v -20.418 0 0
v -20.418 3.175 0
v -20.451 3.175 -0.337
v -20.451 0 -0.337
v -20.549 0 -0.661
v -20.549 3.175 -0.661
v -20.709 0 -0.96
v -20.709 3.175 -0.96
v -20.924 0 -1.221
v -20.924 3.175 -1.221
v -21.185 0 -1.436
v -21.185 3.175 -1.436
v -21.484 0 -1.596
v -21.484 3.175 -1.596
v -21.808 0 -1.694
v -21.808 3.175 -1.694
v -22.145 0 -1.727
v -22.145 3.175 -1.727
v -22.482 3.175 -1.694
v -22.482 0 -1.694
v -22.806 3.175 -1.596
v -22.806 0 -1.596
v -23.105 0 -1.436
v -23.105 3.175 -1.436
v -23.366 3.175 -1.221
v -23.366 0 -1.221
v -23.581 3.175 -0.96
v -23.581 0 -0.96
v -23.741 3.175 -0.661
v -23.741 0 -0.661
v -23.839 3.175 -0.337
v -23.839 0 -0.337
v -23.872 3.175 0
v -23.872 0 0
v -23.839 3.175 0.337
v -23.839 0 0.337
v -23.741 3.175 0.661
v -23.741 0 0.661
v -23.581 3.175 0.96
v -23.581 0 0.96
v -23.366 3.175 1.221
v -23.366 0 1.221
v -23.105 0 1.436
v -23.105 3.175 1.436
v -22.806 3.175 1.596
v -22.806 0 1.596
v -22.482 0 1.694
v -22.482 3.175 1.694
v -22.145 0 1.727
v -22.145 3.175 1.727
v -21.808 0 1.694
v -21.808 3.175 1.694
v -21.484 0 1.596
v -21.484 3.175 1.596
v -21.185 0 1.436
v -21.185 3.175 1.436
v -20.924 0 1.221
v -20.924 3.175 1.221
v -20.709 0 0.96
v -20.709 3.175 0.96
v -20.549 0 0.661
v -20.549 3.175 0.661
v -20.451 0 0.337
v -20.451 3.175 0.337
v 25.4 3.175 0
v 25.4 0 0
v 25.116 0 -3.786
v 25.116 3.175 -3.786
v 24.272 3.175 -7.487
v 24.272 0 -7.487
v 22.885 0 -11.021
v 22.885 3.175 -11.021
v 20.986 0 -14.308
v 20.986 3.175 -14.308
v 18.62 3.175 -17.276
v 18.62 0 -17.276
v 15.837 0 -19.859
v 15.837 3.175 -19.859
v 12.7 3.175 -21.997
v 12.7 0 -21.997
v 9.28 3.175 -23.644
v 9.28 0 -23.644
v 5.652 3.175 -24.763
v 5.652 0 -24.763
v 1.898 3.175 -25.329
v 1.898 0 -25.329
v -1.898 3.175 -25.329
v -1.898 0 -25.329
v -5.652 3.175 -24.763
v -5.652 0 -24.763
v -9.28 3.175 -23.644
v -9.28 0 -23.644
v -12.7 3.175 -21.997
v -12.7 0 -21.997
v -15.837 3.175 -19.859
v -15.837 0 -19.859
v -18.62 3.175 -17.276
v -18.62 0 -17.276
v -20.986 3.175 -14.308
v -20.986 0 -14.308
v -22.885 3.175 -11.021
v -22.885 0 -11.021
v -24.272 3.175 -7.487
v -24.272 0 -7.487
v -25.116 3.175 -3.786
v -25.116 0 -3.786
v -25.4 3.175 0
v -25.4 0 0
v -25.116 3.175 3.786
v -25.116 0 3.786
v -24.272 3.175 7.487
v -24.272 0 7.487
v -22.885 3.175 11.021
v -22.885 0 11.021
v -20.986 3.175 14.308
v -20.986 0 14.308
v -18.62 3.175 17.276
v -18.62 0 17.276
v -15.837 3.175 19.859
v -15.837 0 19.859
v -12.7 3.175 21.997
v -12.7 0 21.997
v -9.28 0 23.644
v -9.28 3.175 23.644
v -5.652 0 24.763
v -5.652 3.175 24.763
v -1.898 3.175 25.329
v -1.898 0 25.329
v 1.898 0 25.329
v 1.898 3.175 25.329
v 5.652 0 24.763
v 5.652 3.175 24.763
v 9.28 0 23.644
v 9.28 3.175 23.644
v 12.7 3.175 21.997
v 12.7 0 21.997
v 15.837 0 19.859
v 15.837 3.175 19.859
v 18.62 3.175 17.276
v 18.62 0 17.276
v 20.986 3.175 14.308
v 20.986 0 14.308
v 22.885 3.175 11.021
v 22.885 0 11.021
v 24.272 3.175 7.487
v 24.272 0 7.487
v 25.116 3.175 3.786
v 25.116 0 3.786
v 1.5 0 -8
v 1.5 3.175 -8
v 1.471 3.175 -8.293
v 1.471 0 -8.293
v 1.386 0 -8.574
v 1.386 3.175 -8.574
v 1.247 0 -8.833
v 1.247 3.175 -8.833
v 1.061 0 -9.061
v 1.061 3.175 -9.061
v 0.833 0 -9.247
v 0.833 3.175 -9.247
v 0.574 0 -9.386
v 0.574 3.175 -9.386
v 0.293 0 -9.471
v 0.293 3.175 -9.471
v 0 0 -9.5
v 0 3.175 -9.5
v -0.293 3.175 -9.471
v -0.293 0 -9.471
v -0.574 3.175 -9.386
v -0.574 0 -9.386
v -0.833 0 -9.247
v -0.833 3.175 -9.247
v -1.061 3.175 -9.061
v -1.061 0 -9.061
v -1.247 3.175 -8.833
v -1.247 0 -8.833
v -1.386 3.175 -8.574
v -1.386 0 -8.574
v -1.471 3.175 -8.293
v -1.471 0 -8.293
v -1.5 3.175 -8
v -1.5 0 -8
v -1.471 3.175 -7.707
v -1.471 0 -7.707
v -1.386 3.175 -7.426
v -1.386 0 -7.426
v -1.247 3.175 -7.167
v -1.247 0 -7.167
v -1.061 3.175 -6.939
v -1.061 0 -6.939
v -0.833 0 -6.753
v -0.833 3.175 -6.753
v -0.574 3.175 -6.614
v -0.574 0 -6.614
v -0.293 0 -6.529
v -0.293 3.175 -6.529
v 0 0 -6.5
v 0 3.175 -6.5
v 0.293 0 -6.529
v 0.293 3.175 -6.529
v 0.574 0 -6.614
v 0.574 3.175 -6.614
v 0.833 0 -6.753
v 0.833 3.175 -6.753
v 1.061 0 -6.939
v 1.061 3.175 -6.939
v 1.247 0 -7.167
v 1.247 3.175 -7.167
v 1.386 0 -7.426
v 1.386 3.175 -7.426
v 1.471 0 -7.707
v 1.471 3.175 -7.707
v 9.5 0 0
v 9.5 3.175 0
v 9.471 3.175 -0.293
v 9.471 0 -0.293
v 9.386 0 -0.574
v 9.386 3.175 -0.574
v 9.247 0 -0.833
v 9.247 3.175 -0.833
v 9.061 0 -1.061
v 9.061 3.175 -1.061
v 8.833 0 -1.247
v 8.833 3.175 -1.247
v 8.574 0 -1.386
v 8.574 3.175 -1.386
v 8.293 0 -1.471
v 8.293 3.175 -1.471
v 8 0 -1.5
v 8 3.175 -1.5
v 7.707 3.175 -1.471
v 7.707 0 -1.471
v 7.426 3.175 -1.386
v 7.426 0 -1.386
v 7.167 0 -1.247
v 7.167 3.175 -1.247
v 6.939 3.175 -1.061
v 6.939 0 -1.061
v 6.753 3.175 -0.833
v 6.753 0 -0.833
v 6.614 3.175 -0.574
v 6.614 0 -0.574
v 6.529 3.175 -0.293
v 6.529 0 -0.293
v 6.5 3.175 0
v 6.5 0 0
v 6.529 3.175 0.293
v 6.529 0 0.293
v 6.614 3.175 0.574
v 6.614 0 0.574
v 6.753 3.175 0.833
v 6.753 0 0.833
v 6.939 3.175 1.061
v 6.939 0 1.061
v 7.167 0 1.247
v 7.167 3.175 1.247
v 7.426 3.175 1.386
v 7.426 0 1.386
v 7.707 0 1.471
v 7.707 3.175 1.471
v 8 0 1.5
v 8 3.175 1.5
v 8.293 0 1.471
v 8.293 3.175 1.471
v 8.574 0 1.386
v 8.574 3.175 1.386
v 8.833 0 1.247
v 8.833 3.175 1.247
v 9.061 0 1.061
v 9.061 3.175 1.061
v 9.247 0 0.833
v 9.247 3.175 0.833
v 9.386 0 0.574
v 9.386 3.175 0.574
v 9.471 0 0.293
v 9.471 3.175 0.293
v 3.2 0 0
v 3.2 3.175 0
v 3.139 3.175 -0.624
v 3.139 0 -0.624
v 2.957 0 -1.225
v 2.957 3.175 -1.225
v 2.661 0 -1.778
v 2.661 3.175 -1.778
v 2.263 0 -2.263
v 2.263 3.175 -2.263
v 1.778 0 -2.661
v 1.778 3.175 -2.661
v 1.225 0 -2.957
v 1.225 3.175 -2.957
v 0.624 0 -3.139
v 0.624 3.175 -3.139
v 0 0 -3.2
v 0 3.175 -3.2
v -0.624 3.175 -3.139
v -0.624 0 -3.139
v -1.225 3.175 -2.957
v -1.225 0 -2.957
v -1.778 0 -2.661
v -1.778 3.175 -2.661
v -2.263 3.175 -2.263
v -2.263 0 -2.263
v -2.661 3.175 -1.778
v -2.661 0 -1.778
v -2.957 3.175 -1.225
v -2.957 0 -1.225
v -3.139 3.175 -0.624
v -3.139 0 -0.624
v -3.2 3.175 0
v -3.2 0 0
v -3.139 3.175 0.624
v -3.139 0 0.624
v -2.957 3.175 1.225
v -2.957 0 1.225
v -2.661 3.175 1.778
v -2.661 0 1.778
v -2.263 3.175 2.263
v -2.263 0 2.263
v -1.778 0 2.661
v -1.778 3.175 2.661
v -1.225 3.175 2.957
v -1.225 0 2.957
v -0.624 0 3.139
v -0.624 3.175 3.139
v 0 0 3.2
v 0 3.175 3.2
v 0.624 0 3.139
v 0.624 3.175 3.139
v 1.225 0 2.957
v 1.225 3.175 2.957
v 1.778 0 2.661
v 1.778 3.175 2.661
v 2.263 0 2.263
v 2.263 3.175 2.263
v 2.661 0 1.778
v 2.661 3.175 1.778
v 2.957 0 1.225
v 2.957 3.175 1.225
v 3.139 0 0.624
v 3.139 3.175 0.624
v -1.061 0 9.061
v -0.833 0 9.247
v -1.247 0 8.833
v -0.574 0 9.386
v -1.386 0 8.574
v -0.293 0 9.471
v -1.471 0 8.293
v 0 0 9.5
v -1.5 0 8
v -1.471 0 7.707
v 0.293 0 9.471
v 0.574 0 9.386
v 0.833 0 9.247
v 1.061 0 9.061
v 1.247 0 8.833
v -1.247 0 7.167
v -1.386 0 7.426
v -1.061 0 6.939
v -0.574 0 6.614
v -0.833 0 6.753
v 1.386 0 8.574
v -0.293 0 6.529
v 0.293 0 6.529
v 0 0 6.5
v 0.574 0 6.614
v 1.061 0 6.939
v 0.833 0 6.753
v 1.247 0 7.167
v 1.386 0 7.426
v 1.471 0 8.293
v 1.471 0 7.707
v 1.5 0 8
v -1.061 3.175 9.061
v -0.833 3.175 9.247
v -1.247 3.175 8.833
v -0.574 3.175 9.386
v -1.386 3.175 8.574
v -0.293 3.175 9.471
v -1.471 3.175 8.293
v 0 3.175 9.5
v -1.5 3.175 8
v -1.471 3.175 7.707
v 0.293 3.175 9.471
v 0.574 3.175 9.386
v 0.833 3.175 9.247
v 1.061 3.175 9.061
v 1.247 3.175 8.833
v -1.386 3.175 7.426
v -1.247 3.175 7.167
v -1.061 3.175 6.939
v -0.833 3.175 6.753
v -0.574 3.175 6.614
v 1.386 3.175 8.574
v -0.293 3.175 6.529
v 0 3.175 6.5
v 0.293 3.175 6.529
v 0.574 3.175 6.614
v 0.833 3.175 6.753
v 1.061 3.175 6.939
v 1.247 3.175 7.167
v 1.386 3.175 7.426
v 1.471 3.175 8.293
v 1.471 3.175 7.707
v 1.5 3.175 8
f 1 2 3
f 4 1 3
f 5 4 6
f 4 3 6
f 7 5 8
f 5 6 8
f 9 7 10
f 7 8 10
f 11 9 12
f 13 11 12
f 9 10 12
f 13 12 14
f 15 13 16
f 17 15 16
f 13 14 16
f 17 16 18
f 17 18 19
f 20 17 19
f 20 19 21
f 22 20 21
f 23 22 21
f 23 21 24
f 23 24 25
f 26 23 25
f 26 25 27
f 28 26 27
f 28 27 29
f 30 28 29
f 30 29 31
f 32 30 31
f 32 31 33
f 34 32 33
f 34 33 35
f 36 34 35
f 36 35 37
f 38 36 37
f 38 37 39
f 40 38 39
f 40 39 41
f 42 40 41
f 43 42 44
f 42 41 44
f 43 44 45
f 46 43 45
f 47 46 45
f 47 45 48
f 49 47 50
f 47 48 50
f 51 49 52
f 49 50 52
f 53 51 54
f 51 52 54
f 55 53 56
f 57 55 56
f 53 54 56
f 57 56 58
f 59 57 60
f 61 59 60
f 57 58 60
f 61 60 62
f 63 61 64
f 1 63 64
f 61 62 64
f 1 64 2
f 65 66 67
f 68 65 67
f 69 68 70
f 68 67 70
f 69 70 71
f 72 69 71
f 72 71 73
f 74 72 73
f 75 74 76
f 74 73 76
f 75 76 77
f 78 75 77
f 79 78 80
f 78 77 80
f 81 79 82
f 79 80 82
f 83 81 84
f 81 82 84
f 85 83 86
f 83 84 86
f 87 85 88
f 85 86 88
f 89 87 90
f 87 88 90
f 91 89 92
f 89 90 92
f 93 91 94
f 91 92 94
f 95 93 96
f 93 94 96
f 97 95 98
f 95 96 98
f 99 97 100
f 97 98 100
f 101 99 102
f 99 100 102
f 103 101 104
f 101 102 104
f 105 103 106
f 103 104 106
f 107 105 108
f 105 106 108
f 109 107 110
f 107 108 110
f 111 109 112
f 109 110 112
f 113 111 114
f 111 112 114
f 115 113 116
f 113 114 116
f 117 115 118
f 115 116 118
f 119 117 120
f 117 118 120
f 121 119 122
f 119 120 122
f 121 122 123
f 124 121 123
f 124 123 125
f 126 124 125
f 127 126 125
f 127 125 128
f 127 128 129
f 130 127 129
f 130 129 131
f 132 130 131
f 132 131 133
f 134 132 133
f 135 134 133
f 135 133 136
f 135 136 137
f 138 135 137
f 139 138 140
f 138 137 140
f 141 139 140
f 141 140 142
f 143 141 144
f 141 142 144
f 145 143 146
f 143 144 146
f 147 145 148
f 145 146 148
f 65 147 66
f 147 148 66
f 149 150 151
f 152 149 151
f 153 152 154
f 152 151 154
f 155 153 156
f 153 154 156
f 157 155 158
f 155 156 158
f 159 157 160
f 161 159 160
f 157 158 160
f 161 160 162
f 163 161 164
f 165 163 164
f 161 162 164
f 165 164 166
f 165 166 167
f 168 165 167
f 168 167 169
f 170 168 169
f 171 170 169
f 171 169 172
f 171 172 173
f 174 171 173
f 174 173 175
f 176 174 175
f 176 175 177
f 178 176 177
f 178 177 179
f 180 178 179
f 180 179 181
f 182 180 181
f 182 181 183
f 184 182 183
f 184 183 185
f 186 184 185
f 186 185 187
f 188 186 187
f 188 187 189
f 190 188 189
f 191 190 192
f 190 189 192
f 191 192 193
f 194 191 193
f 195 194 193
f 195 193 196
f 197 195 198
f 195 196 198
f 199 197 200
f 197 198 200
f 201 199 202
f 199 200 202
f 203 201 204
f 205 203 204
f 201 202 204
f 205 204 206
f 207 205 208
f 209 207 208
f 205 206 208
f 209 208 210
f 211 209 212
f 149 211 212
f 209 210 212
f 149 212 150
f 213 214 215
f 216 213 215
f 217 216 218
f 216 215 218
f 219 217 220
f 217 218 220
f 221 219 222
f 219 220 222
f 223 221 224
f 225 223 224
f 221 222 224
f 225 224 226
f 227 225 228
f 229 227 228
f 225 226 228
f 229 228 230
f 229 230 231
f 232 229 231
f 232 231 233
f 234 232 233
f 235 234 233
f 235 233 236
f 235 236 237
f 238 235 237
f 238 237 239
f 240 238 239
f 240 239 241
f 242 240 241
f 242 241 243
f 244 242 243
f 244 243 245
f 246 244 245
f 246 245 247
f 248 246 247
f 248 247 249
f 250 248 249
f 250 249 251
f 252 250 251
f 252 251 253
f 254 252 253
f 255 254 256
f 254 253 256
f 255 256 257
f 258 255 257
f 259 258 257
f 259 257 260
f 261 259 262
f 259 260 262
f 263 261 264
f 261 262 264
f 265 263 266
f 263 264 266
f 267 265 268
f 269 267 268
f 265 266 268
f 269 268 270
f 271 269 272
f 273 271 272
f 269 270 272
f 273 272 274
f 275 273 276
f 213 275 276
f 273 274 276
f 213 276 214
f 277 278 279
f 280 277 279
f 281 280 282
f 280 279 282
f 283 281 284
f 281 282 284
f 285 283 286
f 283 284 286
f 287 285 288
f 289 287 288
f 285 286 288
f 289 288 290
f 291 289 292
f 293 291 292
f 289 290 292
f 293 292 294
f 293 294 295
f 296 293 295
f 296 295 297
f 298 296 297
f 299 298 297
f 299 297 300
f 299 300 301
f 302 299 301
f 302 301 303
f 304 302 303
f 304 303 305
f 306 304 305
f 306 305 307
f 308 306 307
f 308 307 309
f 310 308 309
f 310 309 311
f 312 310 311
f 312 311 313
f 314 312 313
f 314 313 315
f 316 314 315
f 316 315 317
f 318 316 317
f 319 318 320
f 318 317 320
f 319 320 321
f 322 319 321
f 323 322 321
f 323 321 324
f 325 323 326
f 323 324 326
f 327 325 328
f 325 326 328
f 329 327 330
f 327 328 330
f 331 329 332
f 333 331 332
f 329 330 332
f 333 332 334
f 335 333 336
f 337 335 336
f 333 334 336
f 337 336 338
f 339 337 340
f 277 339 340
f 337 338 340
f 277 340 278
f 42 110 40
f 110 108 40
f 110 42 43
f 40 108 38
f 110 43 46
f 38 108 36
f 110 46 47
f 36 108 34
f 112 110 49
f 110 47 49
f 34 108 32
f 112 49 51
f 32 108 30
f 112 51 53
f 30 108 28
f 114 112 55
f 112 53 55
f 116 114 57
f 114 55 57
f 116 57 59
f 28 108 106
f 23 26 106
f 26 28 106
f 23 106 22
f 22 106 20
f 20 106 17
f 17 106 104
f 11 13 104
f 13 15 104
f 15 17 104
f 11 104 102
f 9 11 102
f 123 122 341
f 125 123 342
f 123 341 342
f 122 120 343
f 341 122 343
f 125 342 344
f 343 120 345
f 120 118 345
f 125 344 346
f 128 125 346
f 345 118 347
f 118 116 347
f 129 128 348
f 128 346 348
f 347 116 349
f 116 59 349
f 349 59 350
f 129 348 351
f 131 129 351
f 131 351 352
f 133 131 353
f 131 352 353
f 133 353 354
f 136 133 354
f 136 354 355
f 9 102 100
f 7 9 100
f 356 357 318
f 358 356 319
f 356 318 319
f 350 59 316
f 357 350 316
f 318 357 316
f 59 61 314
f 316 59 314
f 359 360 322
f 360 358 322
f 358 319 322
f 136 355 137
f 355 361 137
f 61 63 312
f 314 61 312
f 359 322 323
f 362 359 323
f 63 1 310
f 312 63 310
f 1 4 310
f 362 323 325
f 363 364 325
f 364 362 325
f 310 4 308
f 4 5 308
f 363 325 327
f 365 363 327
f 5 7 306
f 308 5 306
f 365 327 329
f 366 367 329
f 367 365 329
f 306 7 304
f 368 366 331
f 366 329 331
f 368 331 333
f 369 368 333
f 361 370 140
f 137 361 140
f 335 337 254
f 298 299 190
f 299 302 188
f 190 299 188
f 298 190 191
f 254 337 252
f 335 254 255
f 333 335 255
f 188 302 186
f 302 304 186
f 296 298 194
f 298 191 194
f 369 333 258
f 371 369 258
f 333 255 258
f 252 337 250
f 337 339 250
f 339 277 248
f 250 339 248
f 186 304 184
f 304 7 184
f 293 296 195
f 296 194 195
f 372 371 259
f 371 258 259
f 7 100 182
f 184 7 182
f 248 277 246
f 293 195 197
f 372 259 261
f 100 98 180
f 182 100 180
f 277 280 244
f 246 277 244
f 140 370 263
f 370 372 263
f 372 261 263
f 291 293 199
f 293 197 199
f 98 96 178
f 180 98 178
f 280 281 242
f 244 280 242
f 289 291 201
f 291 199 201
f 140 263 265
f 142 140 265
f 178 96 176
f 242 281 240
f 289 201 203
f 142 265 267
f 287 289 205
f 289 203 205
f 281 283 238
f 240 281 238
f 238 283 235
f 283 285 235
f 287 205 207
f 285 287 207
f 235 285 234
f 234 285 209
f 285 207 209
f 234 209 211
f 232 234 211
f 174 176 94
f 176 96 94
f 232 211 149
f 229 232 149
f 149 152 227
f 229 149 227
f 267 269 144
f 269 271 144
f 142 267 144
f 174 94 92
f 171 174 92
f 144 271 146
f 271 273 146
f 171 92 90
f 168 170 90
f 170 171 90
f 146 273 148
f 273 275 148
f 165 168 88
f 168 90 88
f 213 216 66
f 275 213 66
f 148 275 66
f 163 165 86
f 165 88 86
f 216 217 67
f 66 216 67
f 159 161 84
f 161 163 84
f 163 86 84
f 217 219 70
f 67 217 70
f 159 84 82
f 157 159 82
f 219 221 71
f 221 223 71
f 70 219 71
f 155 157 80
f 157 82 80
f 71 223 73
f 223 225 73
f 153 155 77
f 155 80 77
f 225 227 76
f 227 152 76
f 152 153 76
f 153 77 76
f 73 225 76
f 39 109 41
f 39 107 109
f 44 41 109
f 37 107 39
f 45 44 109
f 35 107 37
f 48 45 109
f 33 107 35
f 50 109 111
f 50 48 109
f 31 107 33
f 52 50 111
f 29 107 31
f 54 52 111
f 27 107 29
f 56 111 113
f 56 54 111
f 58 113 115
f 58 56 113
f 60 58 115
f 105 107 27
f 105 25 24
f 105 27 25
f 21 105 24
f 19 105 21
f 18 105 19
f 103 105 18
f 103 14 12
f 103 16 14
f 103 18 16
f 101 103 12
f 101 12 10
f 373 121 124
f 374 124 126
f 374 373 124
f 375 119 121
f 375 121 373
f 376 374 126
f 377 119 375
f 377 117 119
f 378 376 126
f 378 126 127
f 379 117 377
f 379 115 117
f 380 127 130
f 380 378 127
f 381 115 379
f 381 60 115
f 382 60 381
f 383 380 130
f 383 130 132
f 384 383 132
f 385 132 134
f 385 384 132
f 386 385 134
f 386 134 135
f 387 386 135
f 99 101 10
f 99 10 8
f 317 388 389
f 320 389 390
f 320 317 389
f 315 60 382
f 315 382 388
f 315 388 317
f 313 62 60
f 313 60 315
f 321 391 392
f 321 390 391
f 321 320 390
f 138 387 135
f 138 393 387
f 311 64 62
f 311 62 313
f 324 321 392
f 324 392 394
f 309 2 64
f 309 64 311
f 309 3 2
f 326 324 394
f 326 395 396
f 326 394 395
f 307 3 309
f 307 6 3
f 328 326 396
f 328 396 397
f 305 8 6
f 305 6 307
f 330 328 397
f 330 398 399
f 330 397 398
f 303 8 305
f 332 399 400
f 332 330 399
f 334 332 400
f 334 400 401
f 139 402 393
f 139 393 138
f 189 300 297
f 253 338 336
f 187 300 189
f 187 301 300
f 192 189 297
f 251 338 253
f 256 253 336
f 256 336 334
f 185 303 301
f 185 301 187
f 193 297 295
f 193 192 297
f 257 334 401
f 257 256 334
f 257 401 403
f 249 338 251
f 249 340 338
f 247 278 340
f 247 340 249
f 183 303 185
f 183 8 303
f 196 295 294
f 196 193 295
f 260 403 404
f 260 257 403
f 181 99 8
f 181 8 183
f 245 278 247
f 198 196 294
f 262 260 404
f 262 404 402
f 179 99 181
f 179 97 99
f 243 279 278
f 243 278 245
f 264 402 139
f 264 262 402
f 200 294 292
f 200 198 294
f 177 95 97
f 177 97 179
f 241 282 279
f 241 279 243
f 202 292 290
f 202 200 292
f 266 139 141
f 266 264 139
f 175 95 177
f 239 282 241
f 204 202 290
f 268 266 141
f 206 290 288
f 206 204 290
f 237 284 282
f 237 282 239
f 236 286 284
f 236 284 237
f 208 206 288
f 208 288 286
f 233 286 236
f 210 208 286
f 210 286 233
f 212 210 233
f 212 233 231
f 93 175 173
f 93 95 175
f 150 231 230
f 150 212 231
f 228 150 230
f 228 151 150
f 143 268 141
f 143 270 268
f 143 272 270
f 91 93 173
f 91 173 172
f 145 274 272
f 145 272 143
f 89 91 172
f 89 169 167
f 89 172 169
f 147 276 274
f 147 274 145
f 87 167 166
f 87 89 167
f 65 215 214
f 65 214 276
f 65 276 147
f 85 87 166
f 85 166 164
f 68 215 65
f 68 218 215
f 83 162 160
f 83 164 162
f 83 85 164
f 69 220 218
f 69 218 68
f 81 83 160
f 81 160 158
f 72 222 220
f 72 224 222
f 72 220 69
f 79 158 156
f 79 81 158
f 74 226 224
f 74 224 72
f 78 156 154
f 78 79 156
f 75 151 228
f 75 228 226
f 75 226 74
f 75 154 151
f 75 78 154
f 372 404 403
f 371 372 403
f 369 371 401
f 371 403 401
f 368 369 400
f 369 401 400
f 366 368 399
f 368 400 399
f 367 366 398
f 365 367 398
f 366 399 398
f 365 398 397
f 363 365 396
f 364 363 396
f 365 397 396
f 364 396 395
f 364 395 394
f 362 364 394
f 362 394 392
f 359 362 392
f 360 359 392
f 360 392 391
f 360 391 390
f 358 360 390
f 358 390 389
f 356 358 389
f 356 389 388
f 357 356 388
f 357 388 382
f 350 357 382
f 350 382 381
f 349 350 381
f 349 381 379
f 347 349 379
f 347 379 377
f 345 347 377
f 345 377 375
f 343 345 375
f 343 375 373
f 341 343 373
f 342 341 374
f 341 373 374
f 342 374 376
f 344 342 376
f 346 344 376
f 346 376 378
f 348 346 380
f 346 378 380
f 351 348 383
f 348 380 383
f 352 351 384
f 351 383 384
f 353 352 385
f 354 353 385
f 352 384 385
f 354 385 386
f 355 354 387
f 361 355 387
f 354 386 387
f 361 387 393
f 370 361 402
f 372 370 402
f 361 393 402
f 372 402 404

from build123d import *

# Parameters (mm, degrees)
SKETCH1_R           = 25.4
BOSS_EXTRUDE1_DEPTH = 3.175
SKETCH2_R           = 1.7272
CUT_EXTRUDE1_DEPTH  = 4.175
SKETCH3_R           = 3.2004
CUT_EXTRUDE2_DEPTH  = 4.175
SKETCH4_R           = 1.499997
CUT_EXTRUDE3_DEPTH  = 4.175


with BuildPart() as part:
    # Sketch1 → Boss-Extrude1 (new body)
    with BuildSketch(Plane(origin=(0, 0, 0), x_dir=(1, 0, 0), z_dir=(0, 1, 0))):
        Circle(SKETCH1_R)
    extrude(amount=BOSS_EXTRUDE1_DEPTH)

    # Sketch2 → Cut-Extrude1 (cut, through all)
    with BuildSketch(Plane(origin=(0, 3.175, 0), x_dir=(1, 0, 0), z_dir=(0, 1, 0))):
        with Locations((-22.14499, 0)):
            Circle(SKETCH2_R)
    extrude(amount=-CUT_EXTRUDE1_DEPTH, mode=Mode.SUBTRACT)

    # Sketch3 → Cut-Extrude2 (cut, through all)
    with BuildSketch(Plane(origin=(0, 3.175, 0), x_dir=(1, 0, 0), z_dir=(0, 1, 0))):
        Circle(SKETCH3_R)
    extrude(amount=-CUT_EXTRUDE2_DEPTH, mode=Mode.SUBTRACT)

    # Sketch4 → Cut-Extrude3 (cut, through all)
    with BuildSketch(Plane(origin=(0, 3.175, 0), x_dir=(1, 0, 0), z_dir=(0, 1, 0))):
        with Locations((0, 7.999984)):
            Circle(SKETCH4_R)
        with Locations((0, -7.999984)):
            Circle(SKETCH4_R)
        with Locations((7.999984, 0)):
            Circle(SKETCH4_R)
    extrude(amount=-CUT_EXTRUDE3_DEPTH, mode=Mode.SUBTRACT)


solid = part.part
